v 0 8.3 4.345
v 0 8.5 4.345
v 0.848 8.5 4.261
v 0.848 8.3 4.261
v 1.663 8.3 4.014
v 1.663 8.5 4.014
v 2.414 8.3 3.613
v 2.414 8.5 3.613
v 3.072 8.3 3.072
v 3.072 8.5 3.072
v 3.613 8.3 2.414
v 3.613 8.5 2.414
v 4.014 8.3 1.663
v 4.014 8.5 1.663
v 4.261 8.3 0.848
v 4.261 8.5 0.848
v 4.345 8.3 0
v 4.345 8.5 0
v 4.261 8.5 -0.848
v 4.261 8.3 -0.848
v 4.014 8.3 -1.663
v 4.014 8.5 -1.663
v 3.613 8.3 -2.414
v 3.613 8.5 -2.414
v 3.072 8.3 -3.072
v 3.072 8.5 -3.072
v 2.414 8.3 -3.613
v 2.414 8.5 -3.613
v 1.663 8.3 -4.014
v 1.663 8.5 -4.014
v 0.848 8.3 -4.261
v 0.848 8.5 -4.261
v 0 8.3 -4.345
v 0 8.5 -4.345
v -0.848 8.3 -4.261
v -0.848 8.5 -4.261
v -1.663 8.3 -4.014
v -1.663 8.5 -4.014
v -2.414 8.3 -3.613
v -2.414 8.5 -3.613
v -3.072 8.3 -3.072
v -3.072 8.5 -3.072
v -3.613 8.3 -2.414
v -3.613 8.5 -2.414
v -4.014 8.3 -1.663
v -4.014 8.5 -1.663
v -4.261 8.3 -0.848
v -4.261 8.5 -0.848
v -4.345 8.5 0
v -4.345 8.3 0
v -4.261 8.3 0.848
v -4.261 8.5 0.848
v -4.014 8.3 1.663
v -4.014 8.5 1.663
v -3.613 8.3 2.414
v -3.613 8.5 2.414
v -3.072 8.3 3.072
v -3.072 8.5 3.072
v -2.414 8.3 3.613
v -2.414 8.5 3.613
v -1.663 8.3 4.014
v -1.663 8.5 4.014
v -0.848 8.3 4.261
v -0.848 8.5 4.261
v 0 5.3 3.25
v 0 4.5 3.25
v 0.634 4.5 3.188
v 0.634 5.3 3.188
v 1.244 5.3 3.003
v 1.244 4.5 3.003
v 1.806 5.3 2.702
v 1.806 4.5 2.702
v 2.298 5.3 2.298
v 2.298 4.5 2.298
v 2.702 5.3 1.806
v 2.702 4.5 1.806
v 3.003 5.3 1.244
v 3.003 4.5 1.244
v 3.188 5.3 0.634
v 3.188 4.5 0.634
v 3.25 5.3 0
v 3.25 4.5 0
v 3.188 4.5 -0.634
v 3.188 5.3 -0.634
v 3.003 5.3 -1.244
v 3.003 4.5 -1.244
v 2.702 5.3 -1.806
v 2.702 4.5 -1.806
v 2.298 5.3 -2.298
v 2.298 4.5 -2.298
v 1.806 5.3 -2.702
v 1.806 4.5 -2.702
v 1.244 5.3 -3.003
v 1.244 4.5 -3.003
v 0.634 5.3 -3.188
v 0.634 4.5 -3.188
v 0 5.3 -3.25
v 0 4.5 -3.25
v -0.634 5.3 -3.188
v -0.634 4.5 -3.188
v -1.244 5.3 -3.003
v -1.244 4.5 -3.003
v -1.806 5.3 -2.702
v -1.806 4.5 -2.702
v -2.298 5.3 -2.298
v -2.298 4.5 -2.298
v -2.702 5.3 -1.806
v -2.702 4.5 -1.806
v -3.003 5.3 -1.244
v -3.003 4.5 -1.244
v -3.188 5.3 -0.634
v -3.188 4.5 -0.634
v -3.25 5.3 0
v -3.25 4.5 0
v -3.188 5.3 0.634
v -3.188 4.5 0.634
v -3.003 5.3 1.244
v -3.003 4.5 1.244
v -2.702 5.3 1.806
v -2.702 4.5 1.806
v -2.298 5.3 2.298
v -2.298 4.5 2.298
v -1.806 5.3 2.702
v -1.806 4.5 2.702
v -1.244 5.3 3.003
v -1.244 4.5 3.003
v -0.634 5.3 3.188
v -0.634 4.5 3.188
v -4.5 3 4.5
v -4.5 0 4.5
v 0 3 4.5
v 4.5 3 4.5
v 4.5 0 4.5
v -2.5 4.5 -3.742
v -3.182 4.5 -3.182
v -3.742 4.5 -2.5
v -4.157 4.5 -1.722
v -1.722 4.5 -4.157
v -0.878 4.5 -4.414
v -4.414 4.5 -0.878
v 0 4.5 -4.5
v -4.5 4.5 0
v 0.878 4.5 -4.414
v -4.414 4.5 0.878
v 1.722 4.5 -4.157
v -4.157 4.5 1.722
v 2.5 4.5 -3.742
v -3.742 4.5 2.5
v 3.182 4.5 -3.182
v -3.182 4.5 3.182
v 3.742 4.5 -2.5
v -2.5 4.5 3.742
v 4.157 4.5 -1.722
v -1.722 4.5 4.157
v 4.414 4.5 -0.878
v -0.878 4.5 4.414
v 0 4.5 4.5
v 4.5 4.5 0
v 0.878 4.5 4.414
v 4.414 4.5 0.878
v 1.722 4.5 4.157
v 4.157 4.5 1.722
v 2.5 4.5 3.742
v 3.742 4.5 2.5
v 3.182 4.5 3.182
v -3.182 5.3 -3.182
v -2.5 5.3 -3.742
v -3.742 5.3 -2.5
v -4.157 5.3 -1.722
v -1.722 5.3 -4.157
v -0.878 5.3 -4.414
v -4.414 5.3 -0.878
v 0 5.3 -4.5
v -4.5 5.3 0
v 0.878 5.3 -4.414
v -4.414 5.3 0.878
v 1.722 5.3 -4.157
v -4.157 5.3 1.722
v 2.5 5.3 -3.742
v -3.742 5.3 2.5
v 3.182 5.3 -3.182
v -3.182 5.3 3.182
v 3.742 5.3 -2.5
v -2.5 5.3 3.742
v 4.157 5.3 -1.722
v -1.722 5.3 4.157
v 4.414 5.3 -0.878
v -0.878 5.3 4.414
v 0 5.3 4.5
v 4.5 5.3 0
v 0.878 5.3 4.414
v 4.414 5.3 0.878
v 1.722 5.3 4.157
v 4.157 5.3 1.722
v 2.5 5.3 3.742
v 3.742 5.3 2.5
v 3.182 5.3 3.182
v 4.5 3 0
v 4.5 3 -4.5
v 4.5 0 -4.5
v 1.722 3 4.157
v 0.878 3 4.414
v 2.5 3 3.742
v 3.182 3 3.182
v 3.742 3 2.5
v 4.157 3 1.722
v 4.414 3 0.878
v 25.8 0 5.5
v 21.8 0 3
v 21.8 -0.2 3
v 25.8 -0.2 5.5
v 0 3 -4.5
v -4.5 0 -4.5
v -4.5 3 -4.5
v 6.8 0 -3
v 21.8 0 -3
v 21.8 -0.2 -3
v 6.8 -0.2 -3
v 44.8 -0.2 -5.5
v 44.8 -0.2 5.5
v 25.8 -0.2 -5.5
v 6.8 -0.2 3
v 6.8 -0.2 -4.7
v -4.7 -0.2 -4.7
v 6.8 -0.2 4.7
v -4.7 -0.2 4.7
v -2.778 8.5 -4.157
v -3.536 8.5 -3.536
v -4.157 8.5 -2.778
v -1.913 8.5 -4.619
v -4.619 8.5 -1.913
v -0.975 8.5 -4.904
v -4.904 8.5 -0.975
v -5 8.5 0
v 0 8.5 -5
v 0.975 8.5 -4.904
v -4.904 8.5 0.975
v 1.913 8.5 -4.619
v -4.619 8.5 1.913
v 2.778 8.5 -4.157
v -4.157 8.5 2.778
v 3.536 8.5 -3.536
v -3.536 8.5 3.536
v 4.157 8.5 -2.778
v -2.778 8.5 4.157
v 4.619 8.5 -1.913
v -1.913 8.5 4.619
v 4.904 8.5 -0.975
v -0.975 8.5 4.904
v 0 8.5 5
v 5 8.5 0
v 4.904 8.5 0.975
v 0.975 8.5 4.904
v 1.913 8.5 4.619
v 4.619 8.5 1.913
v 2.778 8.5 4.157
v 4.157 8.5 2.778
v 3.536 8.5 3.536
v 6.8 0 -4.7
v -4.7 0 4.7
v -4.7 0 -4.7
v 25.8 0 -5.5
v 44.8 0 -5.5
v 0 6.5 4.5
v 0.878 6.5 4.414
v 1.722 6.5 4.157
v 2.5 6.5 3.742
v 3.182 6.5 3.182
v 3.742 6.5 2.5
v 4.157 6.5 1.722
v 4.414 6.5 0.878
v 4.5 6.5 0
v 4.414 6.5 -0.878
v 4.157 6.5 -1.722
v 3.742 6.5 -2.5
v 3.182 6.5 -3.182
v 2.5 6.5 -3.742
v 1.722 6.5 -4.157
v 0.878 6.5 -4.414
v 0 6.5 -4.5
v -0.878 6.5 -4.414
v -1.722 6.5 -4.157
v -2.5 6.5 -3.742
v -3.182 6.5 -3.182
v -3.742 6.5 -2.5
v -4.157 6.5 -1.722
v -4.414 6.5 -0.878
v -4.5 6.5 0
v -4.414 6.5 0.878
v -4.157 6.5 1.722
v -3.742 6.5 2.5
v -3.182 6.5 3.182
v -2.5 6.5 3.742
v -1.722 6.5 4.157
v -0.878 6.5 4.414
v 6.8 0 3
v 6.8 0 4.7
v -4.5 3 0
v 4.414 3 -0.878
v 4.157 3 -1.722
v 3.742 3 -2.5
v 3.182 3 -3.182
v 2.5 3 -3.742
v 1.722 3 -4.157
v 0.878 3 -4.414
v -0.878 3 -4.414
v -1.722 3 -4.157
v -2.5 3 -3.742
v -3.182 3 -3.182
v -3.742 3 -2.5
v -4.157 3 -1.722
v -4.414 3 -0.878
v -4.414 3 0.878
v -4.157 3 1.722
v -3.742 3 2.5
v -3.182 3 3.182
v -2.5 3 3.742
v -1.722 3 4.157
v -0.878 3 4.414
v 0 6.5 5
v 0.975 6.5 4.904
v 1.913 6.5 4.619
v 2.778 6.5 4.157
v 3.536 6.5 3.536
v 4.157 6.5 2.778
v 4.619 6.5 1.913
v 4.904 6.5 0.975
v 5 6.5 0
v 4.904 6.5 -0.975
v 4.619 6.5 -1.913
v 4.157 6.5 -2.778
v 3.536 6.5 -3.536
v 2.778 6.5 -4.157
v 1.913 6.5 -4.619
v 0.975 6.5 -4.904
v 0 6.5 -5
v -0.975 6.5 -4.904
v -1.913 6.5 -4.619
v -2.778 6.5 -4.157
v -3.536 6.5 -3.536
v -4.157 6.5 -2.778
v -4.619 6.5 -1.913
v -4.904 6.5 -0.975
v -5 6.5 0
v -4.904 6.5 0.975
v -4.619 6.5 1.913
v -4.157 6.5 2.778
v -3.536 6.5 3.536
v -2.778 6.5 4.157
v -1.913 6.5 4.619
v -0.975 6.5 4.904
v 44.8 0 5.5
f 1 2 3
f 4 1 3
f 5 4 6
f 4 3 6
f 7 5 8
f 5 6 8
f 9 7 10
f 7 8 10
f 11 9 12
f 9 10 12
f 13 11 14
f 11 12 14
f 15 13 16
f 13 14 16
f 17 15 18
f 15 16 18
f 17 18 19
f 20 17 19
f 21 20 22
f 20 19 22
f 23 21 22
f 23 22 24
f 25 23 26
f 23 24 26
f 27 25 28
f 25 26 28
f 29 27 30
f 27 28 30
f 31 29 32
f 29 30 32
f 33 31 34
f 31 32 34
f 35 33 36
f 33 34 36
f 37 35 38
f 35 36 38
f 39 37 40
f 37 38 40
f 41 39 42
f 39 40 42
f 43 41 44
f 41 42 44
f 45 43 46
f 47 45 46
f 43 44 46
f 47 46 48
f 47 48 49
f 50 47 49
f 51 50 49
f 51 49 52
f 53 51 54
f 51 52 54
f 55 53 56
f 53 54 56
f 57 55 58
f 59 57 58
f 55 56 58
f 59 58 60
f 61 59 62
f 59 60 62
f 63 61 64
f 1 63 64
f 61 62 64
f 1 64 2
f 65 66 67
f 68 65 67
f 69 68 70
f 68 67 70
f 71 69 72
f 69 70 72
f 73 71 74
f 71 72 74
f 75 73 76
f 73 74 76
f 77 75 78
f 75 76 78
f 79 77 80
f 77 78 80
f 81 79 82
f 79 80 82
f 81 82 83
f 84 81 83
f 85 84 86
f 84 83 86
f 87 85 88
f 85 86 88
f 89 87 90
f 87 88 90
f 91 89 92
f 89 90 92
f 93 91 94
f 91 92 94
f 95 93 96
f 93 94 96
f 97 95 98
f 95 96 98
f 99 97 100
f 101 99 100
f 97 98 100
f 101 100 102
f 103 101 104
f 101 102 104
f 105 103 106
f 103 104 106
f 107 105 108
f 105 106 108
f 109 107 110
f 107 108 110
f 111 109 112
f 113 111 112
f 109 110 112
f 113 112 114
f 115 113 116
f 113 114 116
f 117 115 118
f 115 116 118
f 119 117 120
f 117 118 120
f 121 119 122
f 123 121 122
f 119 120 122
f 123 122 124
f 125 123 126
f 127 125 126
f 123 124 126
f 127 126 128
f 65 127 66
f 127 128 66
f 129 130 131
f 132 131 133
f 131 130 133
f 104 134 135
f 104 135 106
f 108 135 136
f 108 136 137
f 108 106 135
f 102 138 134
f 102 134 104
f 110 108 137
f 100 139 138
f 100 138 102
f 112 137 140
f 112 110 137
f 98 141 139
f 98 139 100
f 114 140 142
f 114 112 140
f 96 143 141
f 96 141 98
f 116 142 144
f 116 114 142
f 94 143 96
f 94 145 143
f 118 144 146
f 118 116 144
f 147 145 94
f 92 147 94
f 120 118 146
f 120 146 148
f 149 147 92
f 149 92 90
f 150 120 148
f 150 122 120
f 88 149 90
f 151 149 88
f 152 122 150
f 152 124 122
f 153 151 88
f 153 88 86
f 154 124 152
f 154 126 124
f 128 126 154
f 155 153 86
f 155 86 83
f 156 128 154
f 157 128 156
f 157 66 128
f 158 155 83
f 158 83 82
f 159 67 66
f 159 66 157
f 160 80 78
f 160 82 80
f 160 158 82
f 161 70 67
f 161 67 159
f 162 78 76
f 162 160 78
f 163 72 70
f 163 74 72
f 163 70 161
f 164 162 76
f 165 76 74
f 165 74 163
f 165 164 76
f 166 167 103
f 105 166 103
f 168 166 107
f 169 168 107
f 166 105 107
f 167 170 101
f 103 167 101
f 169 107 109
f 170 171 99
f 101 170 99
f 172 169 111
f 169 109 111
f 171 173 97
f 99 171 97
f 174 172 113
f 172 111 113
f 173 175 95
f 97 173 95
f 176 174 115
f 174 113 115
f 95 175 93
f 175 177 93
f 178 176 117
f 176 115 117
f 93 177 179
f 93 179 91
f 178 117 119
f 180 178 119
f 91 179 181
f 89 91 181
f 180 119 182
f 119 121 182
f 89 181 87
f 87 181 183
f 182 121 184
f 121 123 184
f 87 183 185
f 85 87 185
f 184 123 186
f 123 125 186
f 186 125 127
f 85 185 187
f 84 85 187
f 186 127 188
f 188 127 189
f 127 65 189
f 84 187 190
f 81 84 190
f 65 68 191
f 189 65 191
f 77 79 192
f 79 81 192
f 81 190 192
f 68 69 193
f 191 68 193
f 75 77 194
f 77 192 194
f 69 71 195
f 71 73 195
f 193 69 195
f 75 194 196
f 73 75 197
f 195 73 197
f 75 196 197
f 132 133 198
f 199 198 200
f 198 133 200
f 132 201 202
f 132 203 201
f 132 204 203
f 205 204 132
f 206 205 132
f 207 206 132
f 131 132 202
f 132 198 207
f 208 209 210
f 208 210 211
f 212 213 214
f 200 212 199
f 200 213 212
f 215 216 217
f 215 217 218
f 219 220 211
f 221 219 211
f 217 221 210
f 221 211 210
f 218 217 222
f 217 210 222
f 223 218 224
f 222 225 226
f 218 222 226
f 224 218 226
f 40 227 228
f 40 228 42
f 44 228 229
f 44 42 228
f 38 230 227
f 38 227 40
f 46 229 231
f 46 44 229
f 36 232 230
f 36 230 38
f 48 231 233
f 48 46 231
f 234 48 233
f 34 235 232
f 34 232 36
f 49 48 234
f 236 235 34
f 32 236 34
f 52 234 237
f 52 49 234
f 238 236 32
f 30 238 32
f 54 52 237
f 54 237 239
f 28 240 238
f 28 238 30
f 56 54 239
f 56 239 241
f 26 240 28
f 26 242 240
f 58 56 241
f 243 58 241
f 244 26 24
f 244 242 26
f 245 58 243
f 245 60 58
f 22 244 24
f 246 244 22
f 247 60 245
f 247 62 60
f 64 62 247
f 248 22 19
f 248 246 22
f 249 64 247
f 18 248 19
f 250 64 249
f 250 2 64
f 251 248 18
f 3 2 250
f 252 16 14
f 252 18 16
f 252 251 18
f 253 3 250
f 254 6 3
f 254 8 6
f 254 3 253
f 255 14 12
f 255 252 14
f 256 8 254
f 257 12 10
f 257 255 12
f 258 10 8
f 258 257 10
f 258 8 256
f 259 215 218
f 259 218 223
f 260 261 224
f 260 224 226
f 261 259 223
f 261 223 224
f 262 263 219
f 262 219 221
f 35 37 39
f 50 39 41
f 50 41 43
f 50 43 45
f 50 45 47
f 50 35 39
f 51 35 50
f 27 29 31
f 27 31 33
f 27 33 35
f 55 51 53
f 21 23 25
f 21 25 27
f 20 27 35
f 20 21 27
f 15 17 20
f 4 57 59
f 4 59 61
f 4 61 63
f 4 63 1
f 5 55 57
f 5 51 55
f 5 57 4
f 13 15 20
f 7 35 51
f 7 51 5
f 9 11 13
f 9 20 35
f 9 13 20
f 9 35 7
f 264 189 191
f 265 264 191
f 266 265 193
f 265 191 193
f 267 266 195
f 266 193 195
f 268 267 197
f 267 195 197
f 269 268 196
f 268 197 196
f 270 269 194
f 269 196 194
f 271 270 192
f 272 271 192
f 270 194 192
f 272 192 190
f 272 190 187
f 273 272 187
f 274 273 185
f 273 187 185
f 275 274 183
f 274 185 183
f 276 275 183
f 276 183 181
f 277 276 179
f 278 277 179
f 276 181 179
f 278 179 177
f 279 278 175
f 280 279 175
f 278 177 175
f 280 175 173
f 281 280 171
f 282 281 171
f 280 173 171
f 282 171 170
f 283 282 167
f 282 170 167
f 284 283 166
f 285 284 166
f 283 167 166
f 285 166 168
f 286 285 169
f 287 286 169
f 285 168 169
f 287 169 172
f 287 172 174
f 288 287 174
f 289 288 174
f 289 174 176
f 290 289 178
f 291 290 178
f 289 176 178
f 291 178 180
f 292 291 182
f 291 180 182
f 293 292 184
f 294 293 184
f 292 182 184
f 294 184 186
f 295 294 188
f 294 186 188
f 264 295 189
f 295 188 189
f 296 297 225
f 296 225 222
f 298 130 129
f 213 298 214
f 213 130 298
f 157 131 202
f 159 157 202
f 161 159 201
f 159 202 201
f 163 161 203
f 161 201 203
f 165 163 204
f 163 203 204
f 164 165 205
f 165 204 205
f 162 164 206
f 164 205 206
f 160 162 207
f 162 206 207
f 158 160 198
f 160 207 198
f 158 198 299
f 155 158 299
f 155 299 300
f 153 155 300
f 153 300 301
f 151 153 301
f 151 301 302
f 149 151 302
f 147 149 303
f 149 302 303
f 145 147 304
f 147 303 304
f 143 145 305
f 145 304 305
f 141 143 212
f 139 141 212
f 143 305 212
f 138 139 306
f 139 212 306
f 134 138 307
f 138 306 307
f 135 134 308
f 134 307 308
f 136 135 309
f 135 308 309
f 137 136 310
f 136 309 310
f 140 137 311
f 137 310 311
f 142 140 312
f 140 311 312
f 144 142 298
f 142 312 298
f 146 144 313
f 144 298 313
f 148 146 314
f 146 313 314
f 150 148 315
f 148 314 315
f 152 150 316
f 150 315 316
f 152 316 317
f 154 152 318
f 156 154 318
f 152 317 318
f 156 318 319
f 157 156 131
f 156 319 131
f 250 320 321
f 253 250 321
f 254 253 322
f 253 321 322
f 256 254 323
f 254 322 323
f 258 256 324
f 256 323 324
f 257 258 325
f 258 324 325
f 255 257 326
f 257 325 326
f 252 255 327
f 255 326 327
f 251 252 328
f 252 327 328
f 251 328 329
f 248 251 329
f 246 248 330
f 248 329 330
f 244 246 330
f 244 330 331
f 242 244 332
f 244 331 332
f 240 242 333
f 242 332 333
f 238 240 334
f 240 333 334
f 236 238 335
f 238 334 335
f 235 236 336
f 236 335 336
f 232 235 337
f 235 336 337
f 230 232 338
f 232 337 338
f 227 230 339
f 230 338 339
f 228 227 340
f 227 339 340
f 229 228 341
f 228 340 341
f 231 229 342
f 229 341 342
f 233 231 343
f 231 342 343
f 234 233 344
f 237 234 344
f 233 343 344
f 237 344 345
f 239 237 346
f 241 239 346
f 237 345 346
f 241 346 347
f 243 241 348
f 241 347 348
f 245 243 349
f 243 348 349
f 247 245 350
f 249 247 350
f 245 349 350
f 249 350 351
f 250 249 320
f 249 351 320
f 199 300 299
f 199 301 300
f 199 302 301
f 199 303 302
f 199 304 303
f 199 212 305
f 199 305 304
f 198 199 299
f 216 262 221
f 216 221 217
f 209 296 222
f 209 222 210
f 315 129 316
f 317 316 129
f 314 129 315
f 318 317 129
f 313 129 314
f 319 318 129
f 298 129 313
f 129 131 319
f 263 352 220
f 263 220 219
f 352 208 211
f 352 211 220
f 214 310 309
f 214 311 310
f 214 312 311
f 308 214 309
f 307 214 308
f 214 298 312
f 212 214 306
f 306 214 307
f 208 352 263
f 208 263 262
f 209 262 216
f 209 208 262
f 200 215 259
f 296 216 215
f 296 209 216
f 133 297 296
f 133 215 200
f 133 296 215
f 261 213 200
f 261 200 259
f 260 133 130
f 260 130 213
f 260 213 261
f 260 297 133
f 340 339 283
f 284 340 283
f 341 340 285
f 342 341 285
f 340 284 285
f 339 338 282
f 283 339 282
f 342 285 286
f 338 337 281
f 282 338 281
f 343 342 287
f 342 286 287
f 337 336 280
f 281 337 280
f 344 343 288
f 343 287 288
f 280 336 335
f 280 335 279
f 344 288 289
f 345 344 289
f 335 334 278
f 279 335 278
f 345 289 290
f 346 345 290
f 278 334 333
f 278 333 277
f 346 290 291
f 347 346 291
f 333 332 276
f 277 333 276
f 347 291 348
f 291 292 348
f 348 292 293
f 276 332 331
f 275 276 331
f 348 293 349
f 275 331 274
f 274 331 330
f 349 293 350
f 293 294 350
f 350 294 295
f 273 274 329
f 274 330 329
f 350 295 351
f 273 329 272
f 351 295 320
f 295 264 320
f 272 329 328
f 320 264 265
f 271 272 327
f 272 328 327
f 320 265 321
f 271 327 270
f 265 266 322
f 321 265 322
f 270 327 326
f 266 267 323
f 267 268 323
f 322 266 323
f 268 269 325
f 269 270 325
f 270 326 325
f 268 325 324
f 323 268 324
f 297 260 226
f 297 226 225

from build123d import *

# Parameters (mm, degrees)
SKETCH1_W           = 9
SKETCH1_H           = 9
BOSS_EXTRUDE1_DEPTH = 3
SKETCH2_R           = 4.5
BOSS_EXTRUDE2_DEPTH = 1.5
SKETCH3_R           = 3.25
BOSS_EXTRUDE3_DEPTH = 0.8
SKETCH4_R           = 4.5
BOSS_EXTRUDE4_DEPTH = 1.2
SKETCH6_R           = 5
BOSS_EXTRUDE5_DEPTH = 2
SKETCH7_R           = 4.344901587
CUT_EXTRUDE1_DEPTH  = 0.2
BOSS_EXTRUDE6_DEPTH = 0.2


with BuildPart() as part:
    # Sketch1 → Boss-Extrude1 (new body)
    with BuildSketch(Plane(origin=(0, 0, 0), x_dir=(1, 0, 0), z_dir=(0, 1, 0))):
        Rectangle(SKETCH1_W, SKETCH1_H)
    extrude(amount=BOSS_EXTRUDE1_DEPTH)

    # Sketch2 → Boss-Extrude2 (add)
    with BuildSketch(Plane(origin=(0, 3, 0), x_dir=(1, 0, 0), z_dir=(0, 1, 0))):
        with Locations(Location((0, 0, 0), (0, 0, 270))):
            Circle(SKETCH2_R)
    extrude(amount=BOSS_EXTRUDE2_DEPTH)

    # Sketch3 → Boss-Extrude3 (add)
    with BuildSketch(Plane(origin=(0, 4.5, 0), x_dir=(1, 0, 0), z_dir=(0, 1, 0))):
        with Locations(Location((0, 0, 0), (0, 0, 270))):
            Circle(SKETCH3_R)
    extrude(amount=BOSS_EXTRUDE3_DEPTH)

    # Sketch4 → Boss-Extrude4 (add)
    with BuildSketch(Plane(origin=(0, 5.3, 0), x_dir=(1, 0, 0), z_dir=(0, 1, 0))):
        with Locations(Location((0, 0, 0), (0, 0, 270))):
            Circle(SKETCH4_R)
    extrude(amount=BOSS_EXTRUDE4_DEPTH)

    # Sketch6 → Boss-Extrude5 (add)
    with BuildSketch(Plane(origin=(0, 6.5, 0), x_dir=(1, 0, 0), z_dir=(0, 1, 0))):
        with Locations(Location((0, 0, 0), (0, 0, 270))):
            Circle(SKETCH6_R)
    extrude(amount=BOSS_EXTRUDE5_DEPTH)

    # Sketch7 → Cut-Extrude1 (cut)
    with BuildSketch(Plane(origin=(0, 8.5, 0), x_dir=(1, 0, 0), z_dir=(0, 1, 0))):
        with Locations(Location((0, 0, 0), (0, 0, 270))):
            Circle(SKETCH7_R)
    extrude(amount=-CUT_EXTRUDE1_DEPTH, mode=Mode.SUBTRACT)

    # Sketch8 → Boss-Extrude6 (add)
    with BuildSketch(Plane.XZ):
        Polygon((6.8, 4.7), (6.8, 3), (21.8, 3), (25.8, 5.5), (44.8, 5.5), (44.8, -5.5), (25.8, -5.5), (21.8, -3), (6.8, -3), (6.8, -4.7), (-4.7, -4.7), (-4.7, 4.7), align=None)
    extrude(amount=BOSS_EXTRUDE6_DEPTH)


solid = part.part
